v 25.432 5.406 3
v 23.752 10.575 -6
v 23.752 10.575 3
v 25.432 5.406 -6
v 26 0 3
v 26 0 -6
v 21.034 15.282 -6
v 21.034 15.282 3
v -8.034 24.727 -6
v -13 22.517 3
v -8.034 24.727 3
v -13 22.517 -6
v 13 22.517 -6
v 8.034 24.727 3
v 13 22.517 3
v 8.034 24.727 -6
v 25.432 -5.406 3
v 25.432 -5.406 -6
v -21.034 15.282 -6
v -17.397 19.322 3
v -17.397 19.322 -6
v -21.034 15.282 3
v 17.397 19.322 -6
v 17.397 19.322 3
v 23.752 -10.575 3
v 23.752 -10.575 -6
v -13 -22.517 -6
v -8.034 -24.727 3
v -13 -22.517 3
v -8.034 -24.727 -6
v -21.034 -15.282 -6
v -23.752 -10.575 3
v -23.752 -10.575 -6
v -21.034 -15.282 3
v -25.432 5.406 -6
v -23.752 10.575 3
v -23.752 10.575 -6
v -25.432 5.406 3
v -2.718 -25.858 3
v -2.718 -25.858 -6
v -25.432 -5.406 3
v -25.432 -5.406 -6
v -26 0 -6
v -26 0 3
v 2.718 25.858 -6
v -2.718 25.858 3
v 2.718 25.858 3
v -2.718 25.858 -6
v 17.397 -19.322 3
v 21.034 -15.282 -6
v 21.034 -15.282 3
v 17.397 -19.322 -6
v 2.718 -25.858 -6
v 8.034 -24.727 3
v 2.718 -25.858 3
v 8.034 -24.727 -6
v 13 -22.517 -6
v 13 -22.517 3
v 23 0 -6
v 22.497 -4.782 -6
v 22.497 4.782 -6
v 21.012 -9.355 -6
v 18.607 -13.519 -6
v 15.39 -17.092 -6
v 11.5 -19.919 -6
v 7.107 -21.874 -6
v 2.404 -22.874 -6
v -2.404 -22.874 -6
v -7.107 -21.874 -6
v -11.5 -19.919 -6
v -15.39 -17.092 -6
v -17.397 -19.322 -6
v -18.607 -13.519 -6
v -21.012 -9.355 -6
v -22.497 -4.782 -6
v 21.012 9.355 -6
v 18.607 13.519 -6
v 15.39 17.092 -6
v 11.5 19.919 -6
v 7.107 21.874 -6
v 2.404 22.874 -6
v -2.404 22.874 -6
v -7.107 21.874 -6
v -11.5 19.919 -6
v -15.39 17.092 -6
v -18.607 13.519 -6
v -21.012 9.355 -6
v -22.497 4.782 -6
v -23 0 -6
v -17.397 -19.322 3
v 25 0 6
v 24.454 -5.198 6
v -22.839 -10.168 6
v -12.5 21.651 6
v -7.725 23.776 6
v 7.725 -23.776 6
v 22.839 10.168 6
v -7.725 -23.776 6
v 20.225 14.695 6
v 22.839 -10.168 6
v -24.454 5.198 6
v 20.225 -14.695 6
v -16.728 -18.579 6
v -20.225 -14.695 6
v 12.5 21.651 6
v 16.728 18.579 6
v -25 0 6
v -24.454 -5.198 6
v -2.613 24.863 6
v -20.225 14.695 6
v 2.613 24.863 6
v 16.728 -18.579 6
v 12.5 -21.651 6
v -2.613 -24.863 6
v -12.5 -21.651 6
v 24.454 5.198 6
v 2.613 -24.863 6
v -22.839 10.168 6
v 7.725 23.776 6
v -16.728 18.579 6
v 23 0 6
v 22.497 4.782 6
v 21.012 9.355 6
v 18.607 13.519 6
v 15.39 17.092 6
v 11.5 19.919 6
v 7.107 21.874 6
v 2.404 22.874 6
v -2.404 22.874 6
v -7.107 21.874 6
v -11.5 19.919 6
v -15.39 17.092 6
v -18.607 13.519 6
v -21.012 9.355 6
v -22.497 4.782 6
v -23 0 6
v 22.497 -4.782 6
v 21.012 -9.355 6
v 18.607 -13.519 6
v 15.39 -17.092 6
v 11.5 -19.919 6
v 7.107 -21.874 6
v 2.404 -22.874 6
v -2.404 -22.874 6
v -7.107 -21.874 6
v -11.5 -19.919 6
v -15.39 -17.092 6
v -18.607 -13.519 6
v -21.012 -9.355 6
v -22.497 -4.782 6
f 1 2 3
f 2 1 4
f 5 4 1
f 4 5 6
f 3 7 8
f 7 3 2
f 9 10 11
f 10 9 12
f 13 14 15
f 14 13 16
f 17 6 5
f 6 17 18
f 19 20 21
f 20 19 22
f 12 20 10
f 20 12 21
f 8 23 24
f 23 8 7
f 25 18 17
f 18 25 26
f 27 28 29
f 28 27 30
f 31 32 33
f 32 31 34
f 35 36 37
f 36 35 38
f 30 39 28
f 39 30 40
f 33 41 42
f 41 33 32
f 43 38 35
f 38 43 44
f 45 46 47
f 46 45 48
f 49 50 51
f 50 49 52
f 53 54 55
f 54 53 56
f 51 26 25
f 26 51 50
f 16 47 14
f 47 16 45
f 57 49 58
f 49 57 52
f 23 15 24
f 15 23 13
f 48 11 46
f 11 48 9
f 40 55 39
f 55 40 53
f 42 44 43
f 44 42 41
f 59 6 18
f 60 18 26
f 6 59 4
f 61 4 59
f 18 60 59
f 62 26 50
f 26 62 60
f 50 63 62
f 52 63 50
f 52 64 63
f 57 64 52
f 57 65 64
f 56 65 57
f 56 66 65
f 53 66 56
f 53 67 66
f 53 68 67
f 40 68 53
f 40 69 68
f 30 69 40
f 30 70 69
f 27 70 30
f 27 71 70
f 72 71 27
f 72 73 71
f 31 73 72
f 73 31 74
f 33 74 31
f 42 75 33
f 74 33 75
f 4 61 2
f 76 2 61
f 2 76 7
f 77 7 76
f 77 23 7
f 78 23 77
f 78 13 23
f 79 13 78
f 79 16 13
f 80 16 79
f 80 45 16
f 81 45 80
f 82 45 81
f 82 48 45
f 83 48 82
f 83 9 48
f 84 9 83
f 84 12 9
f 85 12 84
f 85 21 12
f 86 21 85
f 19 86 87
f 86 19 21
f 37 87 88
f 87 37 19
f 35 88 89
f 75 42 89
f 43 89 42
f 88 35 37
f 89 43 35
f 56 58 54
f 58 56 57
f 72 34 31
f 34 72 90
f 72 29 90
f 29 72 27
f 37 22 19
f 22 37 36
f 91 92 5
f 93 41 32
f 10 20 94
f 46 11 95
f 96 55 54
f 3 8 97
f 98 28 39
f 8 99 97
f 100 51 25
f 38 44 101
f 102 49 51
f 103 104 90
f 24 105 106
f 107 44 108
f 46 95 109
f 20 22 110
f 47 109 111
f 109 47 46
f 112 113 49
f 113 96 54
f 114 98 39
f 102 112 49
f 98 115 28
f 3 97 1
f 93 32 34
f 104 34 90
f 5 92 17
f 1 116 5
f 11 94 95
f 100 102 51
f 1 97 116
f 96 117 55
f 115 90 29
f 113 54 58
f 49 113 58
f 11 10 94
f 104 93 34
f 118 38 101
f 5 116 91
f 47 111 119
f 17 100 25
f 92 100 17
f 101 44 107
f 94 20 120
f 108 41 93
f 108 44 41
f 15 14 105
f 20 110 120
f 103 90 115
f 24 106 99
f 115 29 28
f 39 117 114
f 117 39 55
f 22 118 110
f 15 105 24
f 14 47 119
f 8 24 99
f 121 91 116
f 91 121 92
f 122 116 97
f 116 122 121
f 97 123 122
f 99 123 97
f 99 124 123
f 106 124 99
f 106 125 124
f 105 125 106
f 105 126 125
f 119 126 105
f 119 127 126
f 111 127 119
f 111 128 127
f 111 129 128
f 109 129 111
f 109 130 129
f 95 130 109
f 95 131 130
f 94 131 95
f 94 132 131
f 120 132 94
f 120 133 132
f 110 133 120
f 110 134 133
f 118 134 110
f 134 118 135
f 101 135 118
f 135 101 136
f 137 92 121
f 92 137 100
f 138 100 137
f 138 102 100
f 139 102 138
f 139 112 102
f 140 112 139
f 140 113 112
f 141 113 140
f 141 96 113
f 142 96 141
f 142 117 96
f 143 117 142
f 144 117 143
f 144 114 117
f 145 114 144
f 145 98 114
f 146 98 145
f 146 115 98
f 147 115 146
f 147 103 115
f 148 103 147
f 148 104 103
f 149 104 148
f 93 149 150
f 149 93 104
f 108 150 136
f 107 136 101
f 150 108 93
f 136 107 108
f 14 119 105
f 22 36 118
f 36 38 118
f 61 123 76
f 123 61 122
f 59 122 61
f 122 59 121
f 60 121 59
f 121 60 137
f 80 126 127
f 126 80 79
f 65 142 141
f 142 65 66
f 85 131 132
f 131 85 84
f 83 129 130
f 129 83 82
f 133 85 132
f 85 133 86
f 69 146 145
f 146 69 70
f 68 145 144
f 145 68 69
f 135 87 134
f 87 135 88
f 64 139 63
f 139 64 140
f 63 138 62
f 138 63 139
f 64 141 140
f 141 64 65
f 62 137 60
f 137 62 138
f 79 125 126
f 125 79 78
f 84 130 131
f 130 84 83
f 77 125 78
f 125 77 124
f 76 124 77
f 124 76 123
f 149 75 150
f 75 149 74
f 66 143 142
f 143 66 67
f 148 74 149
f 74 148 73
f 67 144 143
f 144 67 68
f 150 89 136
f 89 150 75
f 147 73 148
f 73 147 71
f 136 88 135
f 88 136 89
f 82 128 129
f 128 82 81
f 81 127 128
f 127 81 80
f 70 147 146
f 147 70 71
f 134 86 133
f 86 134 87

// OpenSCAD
difference(){
    union(){
        translate([0,0,-1.5]) cylinder(h=9, r=26, center=true);
        translate([0.0, 0.0, 6.0]) rotate([180, 0, 0]) cylinder(h=3, r1=25, r2=26);
    }
    cylinder(h=14, r=23.0, center=true);
}
